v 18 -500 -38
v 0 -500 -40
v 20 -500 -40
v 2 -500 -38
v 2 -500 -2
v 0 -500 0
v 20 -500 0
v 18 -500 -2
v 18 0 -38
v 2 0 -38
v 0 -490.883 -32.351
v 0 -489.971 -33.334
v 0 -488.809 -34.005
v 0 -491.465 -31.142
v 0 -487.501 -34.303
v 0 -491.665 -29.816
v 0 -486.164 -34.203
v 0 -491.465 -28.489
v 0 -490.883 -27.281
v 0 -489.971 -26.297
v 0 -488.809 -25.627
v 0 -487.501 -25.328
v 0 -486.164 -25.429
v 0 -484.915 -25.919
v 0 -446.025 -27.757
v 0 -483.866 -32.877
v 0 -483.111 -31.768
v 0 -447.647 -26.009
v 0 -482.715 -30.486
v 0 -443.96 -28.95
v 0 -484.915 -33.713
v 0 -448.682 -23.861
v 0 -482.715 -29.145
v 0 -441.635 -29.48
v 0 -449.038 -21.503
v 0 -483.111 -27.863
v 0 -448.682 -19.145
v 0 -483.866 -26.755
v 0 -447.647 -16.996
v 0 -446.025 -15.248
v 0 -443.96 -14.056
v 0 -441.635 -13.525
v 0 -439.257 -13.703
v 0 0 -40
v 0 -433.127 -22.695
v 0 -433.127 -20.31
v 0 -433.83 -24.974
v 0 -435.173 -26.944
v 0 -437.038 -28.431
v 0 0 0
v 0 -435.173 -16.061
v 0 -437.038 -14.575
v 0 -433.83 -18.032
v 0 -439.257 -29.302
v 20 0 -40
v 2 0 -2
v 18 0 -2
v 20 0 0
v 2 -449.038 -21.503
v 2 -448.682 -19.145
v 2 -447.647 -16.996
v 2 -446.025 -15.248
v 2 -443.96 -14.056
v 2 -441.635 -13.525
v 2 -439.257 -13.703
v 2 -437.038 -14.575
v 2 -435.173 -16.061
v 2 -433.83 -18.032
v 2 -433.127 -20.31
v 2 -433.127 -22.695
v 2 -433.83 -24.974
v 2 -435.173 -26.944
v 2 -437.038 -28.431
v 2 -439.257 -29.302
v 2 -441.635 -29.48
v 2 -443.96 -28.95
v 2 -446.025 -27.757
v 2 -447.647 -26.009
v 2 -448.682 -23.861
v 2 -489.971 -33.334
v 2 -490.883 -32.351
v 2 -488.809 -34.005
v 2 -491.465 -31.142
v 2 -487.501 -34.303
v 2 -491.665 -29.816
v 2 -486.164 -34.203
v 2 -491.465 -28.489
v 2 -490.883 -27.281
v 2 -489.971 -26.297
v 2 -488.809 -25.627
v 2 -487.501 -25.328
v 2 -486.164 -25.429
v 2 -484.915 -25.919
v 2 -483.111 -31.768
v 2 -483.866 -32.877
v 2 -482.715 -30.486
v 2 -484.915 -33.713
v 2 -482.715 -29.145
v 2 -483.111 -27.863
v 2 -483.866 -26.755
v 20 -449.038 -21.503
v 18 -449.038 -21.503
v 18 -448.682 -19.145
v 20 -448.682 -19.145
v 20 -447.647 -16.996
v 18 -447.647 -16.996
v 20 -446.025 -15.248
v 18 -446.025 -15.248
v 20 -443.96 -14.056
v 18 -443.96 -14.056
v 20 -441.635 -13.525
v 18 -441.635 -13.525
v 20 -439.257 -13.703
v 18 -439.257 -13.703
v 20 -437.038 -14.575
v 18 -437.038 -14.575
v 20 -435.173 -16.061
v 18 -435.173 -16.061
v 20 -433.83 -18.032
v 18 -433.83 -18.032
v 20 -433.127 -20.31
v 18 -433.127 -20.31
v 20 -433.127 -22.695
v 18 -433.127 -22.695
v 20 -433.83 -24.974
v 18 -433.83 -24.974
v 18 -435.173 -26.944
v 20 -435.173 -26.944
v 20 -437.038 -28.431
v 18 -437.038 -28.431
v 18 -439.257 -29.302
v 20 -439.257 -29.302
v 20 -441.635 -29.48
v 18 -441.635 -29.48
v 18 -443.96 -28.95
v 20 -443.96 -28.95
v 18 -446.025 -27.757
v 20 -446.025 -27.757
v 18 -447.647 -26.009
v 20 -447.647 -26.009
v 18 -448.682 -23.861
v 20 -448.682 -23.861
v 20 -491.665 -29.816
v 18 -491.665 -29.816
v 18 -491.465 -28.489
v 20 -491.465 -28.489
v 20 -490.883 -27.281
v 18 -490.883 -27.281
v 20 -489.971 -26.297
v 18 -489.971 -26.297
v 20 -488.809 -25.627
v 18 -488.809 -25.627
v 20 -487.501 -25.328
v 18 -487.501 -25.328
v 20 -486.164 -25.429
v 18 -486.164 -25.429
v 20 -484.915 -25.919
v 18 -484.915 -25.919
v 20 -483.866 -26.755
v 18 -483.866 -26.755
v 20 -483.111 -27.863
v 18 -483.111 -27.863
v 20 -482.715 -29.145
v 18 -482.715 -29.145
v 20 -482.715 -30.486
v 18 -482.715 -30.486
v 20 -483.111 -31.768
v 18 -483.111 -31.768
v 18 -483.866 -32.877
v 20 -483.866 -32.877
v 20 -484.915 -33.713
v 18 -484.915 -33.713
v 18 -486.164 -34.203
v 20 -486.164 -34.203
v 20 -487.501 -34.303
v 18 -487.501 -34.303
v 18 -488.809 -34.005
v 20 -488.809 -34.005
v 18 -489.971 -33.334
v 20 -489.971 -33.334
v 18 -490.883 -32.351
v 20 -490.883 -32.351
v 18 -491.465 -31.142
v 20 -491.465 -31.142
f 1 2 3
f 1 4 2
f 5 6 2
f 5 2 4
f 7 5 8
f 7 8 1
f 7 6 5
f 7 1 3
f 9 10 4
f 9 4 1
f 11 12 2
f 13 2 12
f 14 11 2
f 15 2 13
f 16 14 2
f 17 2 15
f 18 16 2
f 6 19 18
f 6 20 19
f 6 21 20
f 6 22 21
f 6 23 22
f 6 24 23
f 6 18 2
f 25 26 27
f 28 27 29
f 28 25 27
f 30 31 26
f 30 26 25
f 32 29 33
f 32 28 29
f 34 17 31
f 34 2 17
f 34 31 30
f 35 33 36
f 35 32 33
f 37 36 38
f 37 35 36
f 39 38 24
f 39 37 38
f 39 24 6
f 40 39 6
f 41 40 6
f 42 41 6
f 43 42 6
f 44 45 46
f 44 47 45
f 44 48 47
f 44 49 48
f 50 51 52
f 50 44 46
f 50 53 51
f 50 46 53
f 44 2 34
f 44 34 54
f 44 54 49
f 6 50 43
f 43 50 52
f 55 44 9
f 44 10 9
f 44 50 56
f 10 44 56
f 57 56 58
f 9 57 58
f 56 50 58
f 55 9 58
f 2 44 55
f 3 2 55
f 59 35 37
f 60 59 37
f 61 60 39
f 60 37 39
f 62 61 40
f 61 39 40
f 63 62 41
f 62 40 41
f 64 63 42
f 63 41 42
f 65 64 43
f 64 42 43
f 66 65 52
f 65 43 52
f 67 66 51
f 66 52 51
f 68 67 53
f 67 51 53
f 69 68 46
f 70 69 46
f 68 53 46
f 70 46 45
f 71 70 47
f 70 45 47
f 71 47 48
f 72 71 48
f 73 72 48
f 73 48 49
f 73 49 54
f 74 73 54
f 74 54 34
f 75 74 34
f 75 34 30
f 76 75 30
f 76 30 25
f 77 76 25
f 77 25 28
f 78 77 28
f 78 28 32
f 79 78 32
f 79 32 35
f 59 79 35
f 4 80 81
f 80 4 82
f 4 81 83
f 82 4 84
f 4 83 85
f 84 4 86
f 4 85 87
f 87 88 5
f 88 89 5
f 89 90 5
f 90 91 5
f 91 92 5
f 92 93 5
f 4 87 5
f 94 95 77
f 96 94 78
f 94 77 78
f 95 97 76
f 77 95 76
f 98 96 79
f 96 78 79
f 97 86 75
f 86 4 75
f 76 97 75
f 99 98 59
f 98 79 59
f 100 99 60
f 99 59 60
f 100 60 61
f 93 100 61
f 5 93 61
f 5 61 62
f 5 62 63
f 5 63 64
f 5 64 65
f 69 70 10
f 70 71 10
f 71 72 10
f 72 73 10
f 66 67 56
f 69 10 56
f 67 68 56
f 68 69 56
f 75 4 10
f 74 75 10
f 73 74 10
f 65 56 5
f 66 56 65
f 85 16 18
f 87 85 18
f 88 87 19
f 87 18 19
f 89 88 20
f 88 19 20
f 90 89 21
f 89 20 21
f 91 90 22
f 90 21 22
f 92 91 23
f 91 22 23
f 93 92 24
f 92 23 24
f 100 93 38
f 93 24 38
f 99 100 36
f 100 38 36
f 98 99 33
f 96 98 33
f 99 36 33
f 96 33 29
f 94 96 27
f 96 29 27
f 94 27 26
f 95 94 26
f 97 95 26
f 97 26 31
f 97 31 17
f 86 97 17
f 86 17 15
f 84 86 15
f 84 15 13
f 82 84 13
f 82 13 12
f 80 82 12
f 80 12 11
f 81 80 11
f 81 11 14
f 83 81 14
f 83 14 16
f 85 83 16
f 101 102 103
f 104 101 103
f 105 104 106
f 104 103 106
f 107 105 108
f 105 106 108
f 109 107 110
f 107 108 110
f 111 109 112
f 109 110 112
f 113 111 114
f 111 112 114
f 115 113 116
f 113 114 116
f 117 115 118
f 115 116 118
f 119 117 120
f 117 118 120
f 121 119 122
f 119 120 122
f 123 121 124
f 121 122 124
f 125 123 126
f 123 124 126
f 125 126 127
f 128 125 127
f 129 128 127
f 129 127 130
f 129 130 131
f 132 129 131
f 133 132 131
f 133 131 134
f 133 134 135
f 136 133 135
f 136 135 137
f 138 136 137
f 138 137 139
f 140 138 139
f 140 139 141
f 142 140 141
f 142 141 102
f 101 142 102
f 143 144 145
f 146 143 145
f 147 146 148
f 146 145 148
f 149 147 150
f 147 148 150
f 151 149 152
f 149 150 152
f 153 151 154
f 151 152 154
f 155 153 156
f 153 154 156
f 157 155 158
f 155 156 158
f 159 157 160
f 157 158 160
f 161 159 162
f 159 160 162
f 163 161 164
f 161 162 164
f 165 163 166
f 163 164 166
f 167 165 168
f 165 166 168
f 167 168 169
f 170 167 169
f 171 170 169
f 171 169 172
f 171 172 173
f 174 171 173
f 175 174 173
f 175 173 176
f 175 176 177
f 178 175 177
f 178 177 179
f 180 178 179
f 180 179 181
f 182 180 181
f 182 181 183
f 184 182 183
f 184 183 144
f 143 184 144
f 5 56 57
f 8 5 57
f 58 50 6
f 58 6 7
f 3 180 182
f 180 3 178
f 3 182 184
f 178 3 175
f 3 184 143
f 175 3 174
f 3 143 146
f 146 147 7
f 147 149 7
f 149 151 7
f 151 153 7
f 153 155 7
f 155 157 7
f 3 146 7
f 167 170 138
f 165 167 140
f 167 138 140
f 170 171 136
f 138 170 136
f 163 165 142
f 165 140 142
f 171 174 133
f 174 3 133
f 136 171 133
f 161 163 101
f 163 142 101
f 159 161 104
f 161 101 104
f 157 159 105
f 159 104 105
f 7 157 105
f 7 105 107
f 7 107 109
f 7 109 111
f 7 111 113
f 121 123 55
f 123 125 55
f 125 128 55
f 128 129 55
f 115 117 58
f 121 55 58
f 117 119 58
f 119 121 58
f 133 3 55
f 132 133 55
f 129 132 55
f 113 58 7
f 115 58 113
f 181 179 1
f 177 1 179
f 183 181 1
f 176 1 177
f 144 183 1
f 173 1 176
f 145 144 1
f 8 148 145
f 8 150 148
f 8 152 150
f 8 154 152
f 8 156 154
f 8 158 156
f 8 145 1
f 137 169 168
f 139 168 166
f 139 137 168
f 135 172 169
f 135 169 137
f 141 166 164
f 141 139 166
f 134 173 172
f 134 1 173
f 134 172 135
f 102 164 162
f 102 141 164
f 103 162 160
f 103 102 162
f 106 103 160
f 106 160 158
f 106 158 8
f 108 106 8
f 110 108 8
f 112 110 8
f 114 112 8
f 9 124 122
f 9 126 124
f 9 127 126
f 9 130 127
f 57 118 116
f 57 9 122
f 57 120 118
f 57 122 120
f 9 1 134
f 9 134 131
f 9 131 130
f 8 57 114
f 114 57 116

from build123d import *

# Parameters (mm, degrees)
F0_W     = 20
F0_H     = 40
F0_W_2   = 16
F0_H_2   = 36
F1_DEPTH = 500
F2_R     = 4.5
F2_R_2   = 8
F3_DEPTH = 25


with BuildPart() as f1:
    # F0 (on Front) → F1 (new body)
    with BuildSketch(Plane.XZ):
        with Locations((10, -20)):
            Rectangle(F0_W, F0_H)
        with Locations((10, -20)):
            Rectangle(F0_W_2, F0_H_2, mode=Mode.SUBTRACT)
    extrude(amount=F1_DEPTH)

    # F2 (on face) → F3 (cut)
    with BuildSketch(Plane(origin=(0, 0, 0), x_dir=(0, -1, 0), z_dir=(-1, 0, 0))):
        with Locations((487.16492, -29.815726)):
            Circle(F2_R)
        with Locations((441.037512, -21.502786)):
            Circle(F2_R_2)
    extrude(amount=-F3_DEPTH, mode=Mode.SUBTRACT)


solid = f1.part
